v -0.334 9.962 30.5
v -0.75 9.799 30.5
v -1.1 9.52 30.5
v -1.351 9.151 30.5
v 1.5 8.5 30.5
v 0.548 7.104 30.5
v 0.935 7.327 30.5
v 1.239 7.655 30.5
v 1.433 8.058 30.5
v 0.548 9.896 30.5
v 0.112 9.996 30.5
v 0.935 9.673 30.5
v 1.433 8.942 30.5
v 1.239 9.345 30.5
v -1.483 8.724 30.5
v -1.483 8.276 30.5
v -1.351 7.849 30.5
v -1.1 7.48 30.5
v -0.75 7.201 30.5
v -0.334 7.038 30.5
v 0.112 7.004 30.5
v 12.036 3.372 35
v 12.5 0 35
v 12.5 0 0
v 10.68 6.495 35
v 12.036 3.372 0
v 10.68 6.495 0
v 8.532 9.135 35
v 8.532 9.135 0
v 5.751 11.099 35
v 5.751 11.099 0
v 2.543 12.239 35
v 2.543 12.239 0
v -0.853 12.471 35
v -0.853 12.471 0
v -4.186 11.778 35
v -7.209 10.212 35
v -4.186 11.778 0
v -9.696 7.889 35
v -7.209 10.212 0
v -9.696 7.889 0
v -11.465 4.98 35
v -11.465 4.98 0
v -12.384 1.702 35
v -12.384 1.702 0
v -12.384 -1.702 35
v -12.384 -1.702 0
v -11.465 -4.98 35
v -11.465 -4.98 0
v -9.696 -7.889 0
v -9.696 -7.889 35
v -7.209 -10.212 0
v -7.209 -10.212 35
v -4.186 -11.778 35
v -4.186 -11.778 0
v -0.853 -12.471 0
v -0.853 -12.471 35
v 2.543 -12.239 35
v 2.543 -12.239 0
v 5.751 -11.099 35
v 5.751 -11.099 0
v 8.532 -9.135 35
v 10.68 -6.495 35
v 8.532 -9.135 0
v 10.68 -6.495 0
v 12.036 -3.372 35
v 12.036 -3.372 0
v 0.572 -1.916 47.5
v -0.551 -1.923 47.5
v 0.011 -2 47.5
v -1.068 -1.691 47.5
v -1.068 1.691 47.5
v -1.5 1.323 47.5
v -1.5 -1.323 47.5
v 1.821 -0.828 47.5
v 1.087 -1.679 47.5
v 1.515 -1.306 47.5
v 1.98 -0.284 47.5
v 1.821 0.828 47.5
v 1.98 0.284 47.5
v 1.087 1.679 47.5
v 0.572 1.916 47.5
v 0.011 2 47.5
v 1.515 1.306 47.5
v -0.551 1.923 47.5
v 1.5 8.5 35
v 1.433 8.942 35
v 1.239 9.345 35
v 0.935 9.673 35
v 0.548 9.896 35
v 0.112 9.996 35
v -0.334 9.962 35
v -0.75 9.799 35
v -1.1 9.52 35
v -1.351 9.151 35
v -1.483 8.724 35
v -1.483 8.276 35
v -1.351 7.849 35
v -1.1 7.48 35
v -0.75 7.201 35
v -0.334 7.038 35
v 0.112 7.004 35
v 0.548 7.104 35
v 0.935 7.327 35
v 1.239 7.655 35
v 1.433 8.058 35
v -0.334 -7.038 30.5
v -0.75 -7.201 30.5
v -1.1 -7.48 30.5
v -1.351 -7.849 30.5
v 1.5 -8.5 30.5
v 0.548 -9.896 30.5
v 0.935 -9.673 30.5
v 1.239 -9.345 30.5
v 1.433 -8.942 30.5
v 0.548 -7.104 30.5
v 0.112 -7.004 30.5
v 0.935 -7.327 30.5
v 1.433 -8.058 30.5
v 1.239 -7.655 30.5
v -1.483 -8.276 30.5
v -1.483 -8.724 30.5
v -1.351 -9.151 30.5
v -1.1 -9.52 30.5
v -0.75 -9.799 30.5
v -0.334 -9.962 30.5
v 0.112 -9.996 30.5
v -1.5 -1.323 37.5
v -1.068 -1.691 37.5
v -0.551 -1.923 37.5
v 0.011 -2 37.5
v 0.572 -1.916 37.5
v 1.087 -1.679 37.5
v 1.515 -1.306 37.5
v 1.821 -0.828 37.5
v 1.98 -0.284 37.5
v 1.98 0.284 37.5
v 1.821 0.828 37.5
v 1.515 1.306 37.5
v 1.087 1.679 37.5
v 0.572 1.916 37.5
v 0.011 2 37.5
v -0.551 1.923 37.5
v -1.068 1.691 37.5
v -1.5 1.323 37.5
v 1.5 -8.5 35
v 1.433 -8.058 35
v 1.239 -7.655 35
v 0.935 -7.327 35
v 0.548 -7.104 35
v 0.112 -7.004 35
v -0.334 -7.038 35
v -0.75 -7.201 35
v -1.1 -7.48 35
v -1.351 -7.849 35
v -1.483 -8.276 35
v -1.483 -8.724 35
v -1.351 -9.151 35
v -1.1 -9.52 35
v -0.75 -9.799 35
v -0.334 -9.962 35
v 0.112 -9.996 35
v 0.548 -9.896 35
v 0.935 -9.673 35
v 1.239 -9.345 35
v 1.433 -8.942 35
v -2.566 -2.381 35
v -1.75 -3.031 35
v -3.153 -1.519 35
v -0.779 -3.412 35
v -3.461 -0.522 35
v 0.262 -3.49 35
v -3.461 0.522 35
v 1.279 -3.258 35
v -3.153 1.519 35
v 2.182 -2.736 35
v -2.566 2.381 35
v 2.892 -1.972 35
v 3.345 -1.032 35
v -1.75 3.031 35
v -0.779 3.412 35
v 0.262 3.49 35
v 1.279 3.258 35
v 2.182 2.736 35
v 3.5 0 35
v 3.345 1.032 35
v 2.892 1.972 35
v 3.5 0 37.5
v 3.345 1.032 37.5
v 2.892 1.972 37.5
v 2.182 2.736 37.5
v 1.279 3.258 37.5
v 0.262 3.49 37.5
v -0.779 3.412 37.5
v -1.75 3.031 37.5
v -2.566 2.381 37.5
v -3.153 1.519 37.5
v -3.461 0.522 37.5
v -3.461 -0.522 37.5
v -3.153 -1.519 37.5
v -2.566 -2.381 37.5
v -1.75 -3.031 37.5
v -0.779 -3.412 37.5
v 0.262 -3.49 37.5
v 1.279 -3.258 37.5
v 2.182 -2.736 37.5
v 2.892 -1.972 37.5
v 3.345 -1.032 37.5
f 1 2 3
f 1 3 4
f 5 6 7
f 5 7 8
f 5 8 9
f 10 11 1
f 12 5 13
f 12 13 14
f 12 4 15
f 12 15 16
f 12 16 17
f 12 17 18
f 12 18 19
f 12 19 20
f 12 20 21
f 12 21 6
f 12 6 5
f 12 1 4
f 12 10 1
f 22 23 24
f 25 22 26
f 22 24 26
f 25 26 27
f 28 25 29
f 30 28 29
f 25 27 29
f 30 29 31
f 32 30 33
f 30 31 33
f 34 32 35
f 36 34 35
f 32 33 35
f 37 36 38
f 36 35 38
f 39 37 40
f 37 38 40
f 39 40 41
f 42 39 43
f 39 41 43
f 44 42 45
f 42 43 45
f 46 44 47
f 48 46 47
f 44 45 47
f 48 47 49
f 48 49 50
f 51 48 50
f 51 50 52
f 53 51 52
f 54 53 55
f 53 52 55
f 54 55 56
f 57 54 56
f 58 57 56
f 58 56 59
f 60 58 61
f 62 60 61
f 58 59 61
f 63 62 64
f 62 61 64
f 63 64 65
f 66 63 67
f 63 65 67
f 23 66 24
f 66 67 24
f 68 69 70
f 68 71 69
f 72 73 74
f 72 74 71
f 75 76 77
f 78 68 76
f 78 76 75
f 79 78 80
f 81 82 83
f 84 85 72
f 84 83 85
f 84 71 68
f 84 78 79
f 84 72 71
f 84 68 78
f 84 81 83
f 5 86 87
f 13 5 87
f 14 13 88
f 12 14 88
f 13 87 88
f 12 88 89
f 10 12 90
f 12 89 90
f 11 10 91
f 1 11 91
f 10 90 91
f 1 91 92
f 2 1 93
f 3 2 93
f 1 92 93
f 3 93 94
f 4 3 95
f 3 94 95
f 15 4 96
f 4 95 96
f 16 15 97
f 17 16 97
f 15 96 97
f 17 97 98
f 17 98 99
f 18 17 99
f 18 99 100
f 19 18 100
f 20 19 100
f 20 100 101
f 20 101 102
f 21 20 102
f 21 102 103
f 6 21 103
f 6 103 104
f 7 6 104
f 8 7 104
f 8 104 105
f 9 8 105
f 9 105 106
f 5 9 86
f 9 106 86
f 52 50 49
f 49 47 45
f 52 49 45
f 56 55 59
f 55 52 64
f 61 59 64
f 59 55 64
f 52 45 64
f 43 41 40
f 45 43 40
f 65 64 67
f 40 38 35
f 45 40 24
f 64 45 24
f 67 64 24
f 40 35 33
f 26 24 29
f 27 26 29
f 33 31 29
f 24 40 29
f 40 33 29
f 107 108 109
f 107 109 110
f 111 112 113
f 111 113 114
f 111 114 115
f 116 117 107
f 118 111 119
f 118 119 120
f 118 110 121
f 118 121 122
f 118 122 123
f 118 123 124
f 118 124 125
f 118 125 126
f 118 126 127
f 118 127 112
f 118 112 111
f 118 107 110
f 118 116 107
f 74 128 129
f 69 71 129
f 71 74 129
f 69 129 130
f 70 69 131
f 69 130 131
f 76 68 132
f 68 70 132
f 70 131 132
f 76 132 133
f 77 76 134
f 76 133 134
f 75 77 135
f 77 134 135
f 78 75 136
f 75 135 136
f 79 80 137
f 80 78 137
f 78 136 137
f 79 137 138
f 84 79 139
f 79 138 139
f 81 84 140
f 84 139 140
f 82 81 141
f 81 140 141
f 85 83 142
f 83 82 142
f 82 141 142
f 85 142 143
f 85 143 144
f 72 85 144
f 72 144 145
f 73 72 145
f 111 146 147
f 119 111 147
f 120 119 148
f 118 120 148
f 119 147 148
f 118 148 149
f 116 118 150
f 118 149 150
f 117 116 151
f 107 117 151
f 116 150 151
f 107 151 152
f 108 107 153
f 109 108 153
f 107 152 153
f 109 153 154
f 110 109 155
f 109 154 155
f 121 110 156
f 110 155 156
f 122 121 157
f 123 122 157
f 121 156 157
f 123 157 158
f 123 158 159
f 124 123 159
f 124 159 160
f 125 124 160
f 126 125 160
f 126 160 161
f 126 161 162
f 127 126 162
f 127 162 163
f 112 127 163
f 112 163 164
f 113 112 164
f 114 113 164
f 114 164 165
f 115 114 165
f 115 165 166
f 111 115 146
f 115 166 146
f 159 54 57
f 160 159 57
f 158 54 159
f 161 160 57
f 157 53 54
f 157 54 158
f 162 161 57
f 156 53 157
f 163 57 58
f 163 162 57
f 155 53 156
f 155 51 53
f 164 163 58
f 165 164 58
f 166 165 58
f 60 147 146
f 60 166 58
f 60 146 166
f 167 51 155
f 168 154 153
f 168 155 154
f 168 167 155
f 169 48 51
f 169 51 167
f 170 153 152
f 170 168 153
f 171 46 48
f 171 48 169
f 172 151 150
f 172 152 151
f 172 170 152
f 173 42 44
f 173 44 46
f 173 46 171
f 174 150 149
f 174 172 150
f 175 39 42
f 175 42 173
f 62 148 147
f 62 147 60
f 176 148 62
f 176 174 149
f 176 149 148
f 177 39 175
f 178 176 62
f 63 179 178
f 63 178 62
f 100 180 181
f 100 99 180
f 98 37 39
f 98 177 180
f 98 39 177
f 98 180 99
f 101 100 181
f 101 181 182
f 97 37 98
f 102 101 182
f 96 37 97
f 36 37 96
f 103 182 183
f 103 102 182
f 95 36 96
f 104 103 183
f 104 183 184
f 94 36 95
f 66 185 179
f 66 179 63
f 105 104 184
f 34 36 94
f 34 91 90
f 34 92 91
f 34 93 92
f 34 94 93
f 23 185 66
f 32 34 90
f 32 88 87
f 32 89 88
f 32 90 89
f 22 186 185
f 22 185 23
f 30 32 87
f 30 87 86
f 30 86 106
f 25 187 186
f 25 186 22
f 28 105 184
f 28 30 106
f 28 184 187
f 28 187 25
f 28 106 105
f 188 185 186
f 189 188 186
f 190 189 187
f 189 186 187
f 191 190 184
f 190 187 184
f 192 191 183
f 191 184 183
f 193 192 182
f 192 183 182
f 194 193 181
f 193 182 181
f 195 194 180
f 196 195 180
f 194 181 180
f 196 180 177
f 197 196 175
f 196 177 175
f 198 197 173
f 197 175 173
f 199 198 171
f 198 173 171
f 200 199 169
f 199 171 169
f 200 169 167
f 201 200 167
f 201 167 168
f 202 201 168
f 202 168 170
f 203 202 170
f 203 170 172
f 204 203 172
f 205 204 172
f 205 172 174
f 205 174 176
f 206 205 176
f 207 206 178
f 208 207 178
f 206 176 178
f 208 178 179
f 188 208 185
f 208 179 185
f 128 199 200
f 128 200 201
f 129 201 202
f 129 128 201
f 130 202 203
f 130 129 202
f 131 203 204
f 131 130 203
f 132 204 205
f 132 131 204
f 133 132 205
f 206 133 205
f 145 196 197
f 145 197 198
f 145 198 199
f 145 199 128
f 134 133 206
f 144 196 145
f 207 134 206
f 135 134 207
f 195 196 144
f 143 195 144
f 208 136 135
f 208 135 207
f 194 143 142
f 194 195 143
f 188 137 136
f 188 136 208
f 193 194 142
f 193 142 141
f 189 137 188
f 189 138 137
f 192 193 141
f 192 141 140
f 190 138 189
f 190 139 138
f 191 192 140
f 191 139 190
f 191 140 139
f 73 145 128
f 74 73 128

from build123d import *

# Parameters (mm, degrees)
SKETCH_1_R          = 12.5
EXTRUDE_1_DEPTH     = 35
SKETCH_2_R          = 3.5
EXTRUDE_2_DEPTH     = 2.5
SKETCH_3_R          = 2
EXTRUDE_3_DEPTH     = 10
CUT_EXTRUDE_START   = -10
CUT_EXTRUDE_1_DEPTH = 10
SKETCH_5_R          = 1.5
CUT_EXTRUDE_2_DEPTH = 4.5


with BuildPart() as part:
    # 草图1 → 凸台-拉伸1 (new body)
    with BuildSketch(Plane.XY):
        Circle(SKETCH_1_R)
    extrude(amount=EXTRUDE_1_DEPTH)

    # 草图2 → 凸台-拉伸2 (add)
    with BuildSketch(Plane.XY.offset(35)):
        Circle(SKETCH_2_R)
    extrude(amount=EXTRUDE_2_DEPTH)

    # 草图3 → 凸台-拉伸3 (add)
    with BuildSketch(Plane.XY.offset(37.5)):
        Circle(SKETCH_3_R)
    extrude(amount=EXTRUDE_3_DEPTH)

    # 草图4 → 切除-拉伸1 (cut)
    with BuildSketch(Plane.XY.offset(47.5).offset(CUT_EXTRUDE_START)):
        with BuildLine():
            Line((-1.5, 1.322875656), (-1.5, -1.322875656))
            ThreePointArc((-1.5, -1.322875656), (-2, 0), (-1.5, 1.322875656))
        make_face()
    extrude(amount=CUT_EXTRUDE_1_DEPTH, mode=Mode.SUBTRACT)

    # 草图5 → 切除-拉伸2 (cut)
    with BuildSketch(Plane.XY.offset(35)):
        with Locations((0, 8.5)):
            Circle(SKETCH_5_R)
        with Locations((0, -8.5)):
            Circle(SKETCH_5_R)
    extrude(amount=-CUT_EXTRUDE_2_DEPTH, mode=Mode.SUBTRACT)


solid = part.part
